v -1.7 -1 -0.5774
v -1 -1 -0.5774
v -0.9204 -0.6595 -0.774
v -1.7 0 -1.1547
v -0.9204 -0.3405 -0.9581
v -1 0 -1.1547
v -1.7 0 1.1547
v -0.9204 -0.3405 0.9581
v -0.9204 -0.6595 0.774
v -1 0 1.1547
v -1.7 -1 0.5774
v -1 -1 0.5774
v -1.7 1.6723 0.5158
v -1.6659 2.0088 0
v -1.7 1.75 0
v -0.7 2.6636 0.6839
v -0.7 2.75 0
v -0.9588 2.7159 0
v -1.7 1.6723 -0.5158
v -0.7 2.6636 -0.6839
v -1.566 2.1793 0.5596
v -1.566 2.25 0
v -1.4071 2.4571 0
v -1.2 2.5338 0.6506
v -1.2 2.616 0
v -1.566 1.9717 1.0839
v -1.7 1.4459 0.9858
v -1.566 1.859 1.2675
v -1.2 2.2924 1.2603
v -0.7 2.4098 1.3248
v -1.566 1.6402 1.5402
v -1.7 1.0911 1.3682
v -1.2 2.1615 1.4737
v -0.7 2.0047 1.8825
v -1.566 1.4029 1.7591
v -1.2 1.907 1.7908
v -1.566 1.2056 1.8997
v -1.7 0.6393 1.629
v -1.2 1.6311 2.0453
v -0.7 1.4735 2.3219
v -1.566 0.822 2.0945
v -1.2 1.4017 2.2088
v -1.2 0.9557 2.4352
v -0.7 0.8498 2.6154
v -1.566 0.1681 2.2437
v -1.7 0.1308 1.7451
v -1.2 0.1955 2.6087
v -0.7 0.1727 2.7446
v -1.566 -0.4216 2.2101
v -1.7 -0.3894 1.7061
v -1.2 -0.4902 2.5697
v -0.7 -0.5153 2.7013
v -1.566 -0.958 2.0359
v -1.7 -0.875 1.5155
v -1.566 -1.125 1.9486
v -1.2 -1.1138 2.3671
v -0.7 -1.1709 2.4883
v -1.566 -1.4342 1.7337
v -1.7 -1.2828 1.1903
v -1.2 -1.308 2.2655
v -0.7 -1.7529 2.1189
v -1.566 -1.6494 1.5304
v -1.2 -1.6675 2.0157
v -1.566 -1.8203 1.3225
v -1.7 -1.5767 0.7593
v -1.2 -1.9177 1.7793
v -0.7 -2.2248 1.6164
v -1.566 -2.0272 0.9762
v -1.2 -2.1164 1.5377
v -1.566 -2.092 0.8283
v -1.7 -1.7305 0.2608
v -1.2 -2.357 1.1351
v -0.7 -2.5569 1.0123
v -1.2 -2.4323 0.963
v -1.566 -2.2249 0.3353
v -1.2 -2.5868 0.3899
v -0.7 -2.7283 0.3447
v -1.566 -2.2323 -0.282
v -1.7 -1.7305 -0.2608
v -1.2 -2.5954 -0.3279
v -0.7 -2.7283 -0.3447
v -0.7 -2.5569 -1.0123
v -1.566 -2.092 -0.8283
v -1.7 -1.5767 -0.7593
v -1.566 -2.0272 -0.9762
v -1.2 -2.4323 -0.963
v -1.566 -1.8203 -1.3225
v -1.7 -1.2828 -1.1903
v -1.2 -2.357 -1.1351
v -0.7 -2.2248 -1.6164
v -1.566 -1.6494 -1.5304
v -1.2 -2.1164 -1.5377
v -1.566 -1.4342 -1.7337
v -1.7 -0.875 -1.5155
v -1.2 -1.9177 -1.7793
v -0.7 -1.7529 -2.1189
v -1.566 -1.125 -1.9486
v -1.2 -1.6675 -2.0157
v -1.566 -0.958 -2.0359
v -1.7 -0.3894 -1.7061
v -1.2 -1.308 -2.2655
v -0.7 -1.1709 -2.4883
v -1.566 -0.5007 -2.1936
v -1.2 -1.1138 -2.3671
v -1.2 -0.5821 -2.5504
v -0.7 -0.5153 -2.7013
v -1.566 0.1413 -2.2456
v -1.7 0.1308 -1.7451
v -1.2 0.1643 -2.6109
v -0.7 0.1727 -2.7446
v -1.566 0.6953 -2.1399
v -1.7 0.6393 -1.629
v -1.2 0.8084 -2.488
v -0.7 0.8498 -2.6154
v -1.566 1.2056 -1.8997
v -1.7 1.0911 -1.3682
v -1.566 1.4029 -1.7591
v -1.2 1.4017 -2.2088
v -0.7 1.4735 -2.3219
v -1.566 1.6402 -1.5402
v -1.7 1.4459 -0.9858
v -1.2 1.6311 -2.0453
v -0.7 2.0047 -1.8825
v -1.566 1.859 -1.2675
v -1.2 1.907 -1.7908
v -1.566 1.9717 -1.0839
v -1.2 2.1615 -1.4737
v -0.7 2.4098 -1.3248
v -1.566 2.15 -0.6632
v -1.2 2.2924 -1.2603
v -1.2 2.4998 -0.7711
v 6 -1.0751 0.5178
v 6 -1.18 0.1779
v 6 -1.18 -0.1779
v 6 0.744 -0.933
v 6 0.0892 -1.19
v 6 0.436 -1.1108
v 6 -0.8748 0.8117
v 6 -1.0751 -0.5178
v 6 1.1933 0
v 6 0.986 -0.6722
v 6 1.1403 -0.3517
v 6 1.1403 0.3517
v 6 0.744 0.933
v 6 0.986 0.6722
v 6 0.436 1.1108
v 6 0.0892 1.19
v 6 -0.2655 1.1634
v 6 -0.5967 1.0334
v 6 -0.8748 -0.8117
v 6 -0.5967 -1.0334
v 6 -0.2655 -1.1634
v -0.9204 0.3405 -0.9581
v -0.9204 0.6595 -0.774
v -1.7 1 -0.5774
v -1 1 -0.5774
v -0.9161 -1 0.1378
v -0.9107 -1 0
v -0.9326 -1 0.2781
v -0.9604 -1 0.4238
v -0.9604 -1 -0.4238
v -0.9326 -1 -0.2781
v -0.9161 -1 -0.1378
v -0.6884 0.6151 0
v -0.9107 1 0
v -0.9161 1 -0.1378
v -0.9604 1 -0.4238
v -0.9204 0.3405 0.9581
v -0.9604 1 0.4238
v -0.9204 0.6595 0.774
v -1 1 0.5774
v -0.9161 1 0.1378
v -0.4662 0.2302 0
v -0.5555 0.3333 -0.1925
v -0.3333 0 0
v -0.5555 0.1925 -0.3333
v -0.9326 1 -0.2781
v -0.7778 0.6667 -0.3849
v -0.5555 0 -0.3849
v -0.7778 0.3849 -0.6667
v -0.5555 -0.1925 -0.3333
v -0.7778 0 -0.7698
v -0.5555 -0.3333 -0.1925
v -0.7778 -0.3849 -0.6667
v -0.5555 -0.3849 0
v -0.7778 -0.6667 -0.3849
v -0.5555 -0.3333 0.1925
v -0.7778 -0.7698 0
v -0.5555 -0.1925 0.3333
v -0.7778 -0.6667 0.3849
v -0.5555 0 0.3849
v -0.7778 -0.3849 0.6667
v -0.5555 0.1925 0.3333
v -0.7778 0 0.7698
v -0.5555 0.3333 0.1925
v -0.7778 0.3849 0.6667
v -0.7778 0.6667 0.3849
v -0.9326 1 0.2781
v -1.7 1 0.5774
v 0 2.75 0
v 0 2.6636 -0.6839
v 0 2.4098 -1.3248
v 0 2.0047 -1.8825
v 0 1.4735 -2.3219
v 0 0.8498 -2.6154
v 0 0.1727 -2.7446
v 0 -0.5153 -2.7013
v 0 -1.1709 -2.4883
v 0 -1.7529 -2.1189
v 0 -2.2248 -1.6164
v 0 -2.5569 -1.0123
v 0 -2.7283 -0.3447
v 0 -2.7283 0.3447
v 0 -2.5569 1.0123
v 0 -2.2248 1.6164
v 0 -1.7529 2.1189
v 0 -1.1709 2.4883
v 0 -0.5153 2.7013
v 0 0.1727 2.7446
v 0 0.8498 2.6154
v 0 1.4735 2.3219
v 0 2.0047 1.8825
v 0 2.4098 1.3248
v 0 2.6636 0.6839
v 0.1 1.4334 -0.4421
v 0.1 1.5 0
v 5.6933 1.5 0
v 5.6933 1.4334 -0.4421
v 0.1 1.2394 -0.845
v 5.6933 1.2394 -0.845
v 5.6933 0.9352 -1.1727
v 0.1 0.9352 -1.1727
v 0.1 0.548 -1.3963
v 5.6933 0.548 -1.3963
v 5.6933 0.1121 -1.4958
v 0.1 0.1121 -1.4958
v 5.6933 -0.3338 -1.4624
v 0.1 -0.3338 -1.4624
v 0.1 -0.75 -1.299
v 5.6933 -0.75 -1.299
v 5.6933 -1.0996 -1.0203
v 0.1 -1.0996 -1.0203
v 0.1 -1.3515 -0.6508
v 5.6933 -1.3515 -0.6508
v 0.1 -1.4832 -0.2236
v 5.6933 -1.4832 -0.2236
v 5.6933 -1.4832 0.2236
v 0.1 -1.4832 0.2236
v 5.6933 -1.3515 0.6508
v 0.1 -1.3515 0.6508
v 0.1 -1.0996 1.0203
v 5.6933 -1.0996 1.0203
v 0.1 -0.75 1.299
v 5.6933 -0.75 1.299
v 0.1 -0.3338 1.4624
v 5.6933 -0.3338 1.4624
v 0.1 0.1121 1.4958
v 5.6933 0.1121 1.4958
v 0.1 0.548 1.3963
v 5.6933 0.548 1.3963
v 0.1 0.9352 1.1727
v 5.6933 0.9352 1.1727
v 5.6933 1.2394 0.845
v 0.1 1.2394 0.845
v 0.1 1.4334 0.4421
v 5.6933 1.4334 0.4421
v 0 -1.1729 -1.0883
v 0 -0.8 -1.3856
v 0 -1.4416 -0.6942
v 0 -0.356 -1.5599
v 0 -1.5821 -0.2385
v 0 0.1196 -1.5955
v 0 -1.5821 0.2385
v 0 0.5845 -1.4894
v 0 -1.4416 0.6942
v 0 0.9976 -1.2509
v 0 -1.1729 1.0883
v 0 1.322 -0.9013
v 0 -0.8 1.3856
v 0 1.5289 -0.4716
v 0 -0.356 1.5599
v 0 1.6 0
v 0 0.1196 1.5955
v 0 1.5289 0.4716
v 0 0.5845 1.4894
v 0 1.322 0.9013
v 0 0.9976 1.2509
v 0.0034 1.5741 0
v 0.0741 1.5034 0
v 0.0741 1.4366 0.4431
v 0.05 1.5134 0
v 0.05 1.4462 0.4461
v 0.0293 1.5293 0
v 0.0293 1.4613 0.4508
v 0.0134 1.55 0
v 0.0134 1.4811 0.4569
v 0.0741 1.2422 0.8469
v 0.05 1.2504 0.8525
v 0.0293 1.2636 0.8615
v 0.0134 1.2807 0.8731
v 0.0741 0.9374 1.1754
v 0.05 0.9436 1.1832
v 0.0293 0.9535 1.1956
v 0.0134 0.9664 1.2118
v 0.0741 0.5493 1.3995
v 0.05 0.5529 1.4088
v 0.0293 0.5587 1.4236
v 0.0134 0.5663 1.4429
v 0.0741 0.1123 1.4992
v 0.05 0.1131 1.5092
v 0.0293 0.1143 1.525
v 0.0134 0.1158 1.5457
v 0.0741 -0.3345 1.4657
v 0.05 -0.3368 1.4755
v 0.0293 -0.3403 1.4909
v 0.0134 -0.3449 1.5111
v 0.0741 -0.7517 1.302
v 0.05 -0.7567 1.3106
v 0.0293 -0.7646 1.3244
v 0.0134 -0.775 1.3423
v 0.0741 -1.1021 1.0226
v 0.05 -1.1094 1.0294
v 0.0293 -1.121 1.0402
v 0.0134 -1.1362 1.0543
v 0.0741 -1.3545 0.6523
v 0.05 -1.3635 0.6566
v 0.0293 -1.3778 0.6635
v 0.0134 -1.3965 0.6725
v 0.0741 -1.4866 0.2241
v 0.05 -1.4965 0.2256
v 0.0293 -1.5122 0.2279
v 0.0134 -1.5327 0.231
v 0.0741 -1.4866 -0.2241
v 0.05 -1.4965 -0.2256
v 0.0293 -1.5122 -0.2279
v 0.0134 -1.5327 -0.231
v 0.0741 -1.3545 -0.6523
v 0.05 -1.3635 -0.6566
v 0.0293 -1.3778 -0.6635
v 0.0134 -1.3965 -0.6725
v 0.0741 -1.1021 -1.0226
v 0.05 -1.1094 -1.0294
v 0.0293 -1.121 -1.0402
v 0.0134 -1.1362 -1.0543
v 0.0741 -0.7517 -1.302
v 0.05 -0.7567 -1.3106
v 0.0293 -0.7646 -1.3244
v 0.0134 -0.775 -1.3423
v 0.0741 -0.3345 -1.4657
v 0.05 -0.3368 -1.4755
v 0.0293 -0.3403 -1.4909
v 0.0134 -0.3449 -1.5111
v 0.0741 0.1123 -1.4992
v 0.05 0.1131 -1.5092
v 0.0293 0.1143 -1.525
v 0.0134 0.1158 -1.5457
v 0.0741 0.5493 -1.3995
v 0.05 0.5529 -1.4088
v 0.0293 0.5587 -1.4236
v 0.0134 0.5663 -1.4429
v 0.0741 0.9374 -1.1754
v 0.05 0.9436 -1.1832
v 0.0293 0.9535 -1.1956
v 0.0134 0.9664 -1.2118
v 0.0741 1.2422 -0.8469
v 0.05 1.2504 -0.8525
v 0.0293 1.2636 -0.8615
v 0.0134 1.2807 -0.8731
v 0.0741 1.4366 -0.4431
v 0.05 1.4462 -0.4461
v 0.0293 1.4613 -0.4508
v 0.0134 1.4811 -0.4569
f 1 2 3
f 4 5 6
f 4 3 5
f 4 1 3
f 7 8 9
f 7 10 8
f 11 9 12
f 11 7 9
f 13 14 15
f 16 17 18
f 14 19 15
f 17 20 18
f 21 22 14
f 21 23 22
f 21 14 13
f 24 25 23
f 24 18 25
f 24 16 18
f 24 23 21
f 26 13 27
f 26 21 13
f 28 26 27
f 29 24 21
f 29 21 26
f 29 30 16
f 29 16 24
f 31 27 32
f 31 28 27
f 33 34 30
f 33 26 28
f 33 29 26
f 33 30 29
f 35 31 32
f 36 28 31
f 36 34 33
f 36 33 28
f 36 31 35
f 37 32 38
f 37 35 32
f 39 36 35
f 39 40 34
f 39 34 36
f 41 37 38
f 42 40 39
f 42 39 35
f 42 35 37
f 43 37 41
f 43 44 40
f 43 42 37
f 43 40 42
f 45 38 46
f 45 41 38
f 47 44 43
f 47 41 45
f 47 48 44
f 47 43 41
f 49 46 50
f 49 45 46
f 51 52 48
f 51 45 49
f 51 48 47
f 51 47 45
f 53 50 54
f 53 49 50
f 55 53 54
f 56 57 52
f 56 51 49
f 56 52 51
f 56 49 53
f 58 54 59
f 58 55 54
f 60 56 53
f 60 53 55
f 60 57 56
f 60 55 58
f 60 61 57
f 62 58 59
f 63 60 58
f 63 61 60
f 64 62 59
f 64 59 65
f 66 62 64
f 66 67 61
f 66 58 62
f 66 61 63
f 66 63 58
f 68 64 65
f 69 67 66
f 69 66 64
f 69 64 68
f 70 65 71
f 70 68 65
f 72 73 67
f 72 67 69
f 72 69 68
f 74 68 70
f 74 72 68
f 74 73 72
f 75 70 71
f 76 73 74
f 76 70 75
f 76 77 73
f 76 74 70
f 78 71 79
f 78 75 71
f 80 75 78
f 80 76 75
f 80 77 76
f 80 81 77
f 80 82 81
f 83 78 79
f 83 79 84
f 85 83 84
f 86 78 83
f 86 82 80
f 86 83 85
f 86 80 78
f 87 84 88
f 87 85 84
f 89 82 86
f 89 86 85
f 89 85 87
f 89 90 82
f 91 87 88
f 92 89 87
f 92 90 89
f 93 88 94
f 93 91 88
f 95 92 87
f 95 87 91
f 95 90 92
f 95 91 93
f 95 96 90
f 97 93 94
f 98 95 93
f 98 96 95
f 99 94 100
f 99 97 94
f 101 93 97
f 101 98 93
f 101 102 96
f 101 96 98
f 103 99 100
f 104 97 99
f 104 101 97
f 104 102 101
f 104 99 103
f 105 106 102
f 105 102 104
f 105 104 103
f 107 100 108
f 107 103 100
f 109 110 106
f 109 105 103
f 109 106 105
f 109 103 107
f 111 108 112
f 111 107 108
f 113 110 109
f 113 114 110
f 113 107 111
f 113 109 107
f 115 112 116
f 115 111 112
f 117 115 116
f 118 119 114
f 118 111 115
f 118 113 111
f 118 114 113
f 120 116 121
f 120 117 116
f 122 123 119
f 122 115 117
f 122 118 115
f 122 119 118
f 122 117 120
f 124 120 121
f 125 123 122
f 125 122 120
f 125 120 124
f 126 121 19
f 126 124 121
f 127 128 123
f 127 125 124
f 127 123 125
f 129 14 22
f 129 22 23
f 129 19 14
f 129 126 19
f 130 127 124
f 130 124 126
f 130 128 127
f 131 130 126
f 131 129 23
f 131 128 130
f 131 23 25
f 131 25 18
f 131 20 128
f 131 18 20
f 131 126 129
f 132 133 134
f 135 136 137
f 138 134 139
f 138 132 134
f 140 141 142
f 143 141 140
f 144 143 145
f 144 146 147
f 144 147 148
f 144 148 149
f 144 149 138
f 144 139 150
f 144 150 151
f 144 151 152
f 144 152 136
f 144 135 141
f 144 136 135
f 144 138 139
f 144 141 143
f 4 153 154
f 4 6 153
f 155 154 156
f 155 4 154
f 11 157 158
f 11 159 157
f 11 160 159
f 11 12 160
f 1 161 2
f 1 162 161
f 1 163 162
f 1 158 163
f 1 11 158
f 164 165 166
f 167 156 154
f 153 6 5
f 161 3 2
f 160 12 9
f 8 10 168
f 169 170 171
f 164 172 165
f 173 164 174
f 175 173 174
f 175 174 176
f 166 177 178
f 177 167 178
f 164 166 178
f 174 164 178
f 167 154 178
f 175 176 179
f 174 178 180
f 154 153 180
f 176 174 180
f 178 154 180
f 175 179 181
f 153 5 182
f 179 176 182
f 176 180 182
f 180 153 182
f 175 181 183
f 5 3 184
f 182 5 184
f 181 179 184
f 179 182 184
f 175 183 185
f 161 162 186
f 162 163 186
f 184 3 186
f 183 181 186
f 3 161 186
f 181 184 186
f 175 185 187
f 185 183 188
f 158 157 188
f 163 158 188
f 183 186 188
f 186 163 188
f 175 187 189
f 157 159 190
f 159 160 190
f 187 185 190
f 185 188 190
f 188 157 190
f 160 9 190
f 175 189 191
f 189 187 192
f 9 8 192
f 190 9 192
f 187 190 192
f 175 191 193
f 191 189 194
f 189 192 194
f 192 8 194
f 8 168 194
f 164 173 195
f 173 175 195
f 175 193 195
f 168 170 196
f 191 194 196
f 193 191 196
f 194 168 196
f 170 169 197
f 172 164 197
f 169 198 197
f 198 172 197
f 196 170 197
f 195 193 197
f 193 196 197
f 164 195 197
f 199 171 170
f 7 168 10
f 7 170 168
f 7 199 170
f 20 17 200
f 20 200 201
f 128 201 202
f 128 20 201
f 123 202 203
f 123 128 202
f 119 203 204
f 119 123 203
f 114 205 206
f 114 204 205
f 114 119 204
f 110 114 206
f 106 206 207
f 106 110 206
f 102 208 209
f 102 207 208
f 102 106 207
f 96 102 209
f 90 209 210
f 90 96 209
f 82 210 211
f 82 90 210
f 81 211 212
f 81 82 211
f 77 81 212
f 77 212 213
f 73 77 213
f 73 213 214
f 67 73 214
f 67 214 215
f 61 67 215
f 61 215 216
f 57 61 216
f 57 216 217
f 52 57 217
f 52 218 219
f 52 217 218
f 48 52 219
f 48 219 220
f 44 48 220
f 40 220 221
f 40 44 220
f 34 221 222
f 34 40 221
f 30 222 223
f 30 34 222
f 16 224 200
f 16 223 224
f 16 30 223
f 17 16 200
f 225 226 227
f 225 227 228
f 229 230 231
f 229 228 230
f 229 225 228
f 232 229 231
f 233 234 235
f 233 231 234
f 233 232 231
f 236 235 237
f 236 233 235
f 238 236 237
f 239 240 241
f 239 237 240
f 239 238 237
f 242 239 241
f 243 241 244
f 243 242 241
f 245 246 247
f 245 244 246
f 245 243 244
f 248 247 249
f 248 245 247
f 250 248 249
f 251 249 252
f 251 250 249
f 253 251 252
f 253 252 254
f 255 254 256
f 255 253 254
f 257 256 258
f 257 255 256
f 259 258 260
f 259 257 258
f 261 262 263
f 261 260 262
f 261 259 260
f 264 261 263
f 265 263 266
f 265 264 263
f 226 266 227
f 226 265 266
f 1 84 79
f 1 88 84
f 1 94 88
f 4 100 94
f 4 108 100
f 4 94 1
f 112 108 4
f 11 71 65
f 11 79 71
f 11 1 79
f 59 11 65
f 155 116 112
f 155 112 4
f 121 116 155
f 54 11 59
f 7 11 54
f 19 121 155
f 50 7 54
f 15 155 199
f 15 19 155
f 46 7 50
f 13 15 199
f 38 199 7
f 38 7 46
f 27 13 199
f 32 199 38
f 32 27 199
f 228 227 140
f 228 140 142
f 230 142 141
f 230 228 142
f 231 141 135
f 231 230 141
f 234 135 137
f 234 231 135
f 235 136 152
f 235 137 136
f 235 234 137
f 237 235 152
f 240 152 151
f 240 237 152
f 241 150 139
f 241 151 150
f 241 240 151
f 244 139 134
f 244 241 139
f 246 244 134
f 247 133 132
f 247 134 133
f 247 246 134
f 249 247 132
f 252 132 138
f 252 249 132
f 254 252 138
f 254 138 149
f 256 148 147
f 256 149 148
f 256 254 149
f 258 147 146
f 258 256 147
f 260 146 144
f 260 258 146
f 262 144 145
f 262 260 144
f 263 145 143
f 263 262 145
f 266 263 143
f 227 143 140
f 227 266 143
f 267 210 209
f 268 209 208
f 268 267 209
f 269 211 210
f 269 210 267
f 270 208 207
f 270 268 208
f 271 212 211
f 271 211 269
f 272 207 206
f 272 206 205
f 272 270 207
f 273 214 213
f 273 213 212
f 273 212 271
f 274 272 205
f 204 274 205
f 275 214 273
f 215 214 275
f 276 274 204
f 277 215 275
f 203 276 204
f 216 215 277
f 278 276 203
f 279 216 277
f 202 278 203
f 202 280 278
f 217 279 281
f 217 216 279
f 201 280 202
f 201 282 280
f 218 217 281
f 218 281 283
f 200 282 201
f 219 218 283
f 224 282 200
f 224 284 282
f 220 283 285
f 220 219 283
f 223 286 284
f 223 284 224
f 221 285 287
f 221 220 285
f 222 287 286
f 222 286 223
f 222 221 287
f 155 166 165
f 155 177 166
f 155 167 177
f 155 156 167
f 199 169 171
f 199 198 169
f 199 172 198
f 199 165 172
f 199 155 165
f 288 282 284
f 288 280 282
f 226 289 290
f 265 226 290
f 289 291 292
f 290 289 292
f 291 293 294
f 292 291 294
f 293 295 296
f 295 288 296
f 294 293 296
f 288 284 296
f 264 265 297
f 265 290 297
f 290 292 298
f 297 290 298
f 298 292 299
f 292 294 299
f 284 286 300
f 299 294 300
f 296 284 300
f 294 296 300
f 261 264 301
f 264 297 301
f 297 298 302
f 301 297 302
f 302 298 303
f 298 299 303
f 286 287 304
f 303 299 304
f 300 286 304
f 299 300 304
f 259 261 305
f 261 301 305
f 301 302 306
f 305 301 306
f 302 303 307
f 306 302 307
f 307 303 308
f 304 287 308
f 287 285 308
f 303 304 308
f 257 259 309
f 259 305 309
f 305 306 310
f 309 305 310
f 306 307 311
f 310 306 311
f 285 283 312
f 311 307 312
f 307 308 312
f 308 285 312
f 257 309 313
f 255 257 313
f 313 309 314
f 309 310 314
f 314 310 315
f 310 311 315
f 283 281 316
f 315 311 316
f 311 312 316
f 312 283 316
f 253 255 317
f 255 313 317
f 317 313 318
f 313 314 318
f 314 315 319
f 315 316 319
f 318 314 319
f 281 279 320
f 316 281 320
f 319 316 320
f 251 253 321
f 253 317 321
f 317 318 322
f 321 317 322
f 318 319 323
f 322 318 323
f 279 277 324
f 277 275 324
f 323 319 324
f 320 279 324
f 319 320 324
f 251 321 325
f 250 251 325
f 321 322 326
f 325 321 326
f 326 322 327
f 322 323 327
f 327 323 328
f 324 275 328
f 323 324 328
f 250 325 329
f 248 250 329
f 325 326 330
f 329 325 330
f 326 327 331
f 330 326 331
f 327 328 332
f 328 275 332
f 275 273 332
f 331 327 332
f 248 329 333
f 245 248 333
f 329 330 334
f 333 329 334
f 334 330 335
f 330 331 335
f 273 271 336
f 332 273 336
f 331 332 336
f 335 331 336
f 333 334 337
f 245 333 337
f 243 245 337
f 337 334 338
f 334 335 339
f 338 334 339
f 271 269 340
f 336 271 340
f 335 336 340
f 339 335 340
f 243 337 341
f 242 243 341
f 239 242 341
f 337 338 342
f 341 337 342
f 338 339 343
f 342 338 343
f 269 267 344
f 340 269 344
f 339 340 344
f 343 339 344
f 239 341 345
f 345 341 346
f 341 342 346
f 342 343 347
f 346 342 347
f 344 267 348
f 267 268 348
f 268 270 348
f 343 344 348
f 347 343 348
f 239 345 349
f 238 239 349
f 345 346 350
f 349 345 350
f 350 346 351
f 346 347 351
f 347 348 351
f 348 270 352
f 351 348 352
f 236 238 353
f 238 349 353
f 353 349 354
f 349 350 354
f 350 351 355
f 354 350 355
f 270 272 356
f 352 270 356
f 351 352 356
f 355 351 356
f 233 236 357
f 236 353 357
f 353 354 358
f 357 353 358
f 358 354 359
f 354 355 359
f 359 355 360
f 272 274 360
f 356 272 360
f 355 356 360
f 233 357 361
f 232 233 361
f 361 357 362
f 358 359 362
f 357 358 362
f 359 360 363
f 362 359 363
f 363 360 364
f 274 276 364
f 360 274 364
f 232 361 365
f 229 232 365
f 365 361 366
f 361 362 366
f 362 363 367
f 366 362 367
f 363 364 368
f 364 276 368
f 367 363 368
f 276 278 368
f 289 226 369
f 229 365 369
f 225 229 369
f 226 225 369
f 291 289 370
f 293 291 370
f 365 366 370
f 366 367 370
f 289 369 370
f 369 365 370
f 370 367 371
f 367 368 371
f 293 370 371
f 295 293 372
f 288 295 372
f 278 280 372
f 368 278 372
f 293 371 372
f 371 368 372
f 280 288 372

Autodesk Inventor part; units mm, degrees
ref_plane "YZ Plane" through (0, 0, 0) normal (1, 0, 0) x (0, 1, 0)
ref_plane "XZ Plane" through (0, 0, 0) normal (0, 1, 0) x (-1, 0, 0)
sketch "Sketch1" plane through (0, 0, 0) normal (0, 0, 1) x (1, 0, 0)
  line L0 (-0.3333, 0) -> (6, 0)
  line L1 (6, 0) -> (6, 1.5)
  line L2 (6, 1.5) -> (3, 1.5)
  line L3 (3, 1.5) -> (2.6932, 1.5)
  line L4 (2.6932, 1.5) -> (0, 1.5)
  line L5 (0, 1.5) -> (0, 2.75)
  line L6 (0, 2.75) -> (-1.7, 2.75)
  line L7 (-1.7, 2.75) -> (-1.7, 1.1547)
  line L8 (-1.7, 1.1547) -> (-1, 1.1547)
  line L9 (-1, 1.1547) -> (-0.3333, 0)
  line L10 (-3.24, 0) -> (7.54, 0) projected
  line L11 (0, -0.55) -> (0, 3.3) projected
  line L12 (3, 1.5) -> (0, 1.5) construction
  dimension "d1" = 3
  dimension "d2" = 0.3068
  dimension "d3" = 1.7
  dimension "d4" = 0.7
  dimension "d5" = 60
  dimension "d6" = 3
  dimension "d7" = 3
  dimension "d8" = 2.3094
  dimension "d9" = 5.5
  dimension "d26" = 6
revolve "Body" add sketch "Sketch1" angle 360 about axis through (-0.3333, 0, 0) along (1, 0, 0)
sketch "Sketch2" plane through (-1.7, 0, 0) normal (-1, 0, 0) x (0, 0, 1)
  circle A0 centre (0, 0) radius 1.1547 projected
  line L0 (0, -3.85) -> (0, 3.85) projected
  line L1 (-3.85, 0) -> (3.85, 0) projected
  line L2 (1.1547, 0) -> (0.5774, -1)
  line L3 (0.5774, -1) -> (-0.5774, -1)
  line L4 (-0.5774, -1) -> (-1.1547, 0)
  line L5 (-1.1547, 0) -> (-0.5774, 1)
  line L6 (-0.5774, 1) -> (0.5774, 1)
  line L7 (0.5774, 1) -> (1.1547, 0)
extrude "Slot" add sketch "Sketch2" against normal up to next contours L7 A0 | A0 L2 | L6 L0 A0 | A0 L0 L3 | L0 L6 A0 | A0 L3 L0 | L4 A0 | A0 L5
fillet "Fillet1" radius 1 1 edges at (-1.7, -2.75, 0)
chamfer "Chamfer1" distance 0.3067 distance2 0.3067 1 edges at (6, -1.5, 0) measured on face at (6, 0.3952, 0.0397)
ref_plane "Work Plane1" through (29, 0, 0) normal (0, -1, 0) x (1, 0, 0)
fillet "Fillet2" radius 0.1 1 edges at (0, -1.5, 0)
thread "Thread2" size "M3x0.5" class "6g" standard "ANSI Metric M Profile" full length
equation "\"d15\" = -0.5 * SPD + 0.5 * GD"
equation "\"d16\" = GUL"
equation "\"GD\" = NND"
equation "\"NLG\" = 6"
equation "\"GEL\" = 4.5"
equation "\"KOD\" = 5.7"
equation "\"KOH\" = 1.65"
equation "\"INTI\" = 1.04"
equation "\"GAL\" = 0.61345 * PTC"
equation "\"GUL\" = 0.61345 * PTC"
equation "\"BDM\" = NND"
equation "\"SW\" = 2"
equation "\"RR\" = 1.45"
equation "\"SPD\" = NND - 1.2269 * PTC"
equation "\"R\" = 0.3"
equation "\"TOA\" = 30deg"
equation "\"GD1\" = THREADDIA - 1.2269 * PTC"
equation "\"THREADDIA\" = 3"
equation "\"PTC\" = 0.5"
equation "\"NND\" = 3"
equation "\"KOH1\" = 0.2"
equation "\"E0\" = 2.303"
properties part number "M3x6 Bolt" material "Stainless Steel"
